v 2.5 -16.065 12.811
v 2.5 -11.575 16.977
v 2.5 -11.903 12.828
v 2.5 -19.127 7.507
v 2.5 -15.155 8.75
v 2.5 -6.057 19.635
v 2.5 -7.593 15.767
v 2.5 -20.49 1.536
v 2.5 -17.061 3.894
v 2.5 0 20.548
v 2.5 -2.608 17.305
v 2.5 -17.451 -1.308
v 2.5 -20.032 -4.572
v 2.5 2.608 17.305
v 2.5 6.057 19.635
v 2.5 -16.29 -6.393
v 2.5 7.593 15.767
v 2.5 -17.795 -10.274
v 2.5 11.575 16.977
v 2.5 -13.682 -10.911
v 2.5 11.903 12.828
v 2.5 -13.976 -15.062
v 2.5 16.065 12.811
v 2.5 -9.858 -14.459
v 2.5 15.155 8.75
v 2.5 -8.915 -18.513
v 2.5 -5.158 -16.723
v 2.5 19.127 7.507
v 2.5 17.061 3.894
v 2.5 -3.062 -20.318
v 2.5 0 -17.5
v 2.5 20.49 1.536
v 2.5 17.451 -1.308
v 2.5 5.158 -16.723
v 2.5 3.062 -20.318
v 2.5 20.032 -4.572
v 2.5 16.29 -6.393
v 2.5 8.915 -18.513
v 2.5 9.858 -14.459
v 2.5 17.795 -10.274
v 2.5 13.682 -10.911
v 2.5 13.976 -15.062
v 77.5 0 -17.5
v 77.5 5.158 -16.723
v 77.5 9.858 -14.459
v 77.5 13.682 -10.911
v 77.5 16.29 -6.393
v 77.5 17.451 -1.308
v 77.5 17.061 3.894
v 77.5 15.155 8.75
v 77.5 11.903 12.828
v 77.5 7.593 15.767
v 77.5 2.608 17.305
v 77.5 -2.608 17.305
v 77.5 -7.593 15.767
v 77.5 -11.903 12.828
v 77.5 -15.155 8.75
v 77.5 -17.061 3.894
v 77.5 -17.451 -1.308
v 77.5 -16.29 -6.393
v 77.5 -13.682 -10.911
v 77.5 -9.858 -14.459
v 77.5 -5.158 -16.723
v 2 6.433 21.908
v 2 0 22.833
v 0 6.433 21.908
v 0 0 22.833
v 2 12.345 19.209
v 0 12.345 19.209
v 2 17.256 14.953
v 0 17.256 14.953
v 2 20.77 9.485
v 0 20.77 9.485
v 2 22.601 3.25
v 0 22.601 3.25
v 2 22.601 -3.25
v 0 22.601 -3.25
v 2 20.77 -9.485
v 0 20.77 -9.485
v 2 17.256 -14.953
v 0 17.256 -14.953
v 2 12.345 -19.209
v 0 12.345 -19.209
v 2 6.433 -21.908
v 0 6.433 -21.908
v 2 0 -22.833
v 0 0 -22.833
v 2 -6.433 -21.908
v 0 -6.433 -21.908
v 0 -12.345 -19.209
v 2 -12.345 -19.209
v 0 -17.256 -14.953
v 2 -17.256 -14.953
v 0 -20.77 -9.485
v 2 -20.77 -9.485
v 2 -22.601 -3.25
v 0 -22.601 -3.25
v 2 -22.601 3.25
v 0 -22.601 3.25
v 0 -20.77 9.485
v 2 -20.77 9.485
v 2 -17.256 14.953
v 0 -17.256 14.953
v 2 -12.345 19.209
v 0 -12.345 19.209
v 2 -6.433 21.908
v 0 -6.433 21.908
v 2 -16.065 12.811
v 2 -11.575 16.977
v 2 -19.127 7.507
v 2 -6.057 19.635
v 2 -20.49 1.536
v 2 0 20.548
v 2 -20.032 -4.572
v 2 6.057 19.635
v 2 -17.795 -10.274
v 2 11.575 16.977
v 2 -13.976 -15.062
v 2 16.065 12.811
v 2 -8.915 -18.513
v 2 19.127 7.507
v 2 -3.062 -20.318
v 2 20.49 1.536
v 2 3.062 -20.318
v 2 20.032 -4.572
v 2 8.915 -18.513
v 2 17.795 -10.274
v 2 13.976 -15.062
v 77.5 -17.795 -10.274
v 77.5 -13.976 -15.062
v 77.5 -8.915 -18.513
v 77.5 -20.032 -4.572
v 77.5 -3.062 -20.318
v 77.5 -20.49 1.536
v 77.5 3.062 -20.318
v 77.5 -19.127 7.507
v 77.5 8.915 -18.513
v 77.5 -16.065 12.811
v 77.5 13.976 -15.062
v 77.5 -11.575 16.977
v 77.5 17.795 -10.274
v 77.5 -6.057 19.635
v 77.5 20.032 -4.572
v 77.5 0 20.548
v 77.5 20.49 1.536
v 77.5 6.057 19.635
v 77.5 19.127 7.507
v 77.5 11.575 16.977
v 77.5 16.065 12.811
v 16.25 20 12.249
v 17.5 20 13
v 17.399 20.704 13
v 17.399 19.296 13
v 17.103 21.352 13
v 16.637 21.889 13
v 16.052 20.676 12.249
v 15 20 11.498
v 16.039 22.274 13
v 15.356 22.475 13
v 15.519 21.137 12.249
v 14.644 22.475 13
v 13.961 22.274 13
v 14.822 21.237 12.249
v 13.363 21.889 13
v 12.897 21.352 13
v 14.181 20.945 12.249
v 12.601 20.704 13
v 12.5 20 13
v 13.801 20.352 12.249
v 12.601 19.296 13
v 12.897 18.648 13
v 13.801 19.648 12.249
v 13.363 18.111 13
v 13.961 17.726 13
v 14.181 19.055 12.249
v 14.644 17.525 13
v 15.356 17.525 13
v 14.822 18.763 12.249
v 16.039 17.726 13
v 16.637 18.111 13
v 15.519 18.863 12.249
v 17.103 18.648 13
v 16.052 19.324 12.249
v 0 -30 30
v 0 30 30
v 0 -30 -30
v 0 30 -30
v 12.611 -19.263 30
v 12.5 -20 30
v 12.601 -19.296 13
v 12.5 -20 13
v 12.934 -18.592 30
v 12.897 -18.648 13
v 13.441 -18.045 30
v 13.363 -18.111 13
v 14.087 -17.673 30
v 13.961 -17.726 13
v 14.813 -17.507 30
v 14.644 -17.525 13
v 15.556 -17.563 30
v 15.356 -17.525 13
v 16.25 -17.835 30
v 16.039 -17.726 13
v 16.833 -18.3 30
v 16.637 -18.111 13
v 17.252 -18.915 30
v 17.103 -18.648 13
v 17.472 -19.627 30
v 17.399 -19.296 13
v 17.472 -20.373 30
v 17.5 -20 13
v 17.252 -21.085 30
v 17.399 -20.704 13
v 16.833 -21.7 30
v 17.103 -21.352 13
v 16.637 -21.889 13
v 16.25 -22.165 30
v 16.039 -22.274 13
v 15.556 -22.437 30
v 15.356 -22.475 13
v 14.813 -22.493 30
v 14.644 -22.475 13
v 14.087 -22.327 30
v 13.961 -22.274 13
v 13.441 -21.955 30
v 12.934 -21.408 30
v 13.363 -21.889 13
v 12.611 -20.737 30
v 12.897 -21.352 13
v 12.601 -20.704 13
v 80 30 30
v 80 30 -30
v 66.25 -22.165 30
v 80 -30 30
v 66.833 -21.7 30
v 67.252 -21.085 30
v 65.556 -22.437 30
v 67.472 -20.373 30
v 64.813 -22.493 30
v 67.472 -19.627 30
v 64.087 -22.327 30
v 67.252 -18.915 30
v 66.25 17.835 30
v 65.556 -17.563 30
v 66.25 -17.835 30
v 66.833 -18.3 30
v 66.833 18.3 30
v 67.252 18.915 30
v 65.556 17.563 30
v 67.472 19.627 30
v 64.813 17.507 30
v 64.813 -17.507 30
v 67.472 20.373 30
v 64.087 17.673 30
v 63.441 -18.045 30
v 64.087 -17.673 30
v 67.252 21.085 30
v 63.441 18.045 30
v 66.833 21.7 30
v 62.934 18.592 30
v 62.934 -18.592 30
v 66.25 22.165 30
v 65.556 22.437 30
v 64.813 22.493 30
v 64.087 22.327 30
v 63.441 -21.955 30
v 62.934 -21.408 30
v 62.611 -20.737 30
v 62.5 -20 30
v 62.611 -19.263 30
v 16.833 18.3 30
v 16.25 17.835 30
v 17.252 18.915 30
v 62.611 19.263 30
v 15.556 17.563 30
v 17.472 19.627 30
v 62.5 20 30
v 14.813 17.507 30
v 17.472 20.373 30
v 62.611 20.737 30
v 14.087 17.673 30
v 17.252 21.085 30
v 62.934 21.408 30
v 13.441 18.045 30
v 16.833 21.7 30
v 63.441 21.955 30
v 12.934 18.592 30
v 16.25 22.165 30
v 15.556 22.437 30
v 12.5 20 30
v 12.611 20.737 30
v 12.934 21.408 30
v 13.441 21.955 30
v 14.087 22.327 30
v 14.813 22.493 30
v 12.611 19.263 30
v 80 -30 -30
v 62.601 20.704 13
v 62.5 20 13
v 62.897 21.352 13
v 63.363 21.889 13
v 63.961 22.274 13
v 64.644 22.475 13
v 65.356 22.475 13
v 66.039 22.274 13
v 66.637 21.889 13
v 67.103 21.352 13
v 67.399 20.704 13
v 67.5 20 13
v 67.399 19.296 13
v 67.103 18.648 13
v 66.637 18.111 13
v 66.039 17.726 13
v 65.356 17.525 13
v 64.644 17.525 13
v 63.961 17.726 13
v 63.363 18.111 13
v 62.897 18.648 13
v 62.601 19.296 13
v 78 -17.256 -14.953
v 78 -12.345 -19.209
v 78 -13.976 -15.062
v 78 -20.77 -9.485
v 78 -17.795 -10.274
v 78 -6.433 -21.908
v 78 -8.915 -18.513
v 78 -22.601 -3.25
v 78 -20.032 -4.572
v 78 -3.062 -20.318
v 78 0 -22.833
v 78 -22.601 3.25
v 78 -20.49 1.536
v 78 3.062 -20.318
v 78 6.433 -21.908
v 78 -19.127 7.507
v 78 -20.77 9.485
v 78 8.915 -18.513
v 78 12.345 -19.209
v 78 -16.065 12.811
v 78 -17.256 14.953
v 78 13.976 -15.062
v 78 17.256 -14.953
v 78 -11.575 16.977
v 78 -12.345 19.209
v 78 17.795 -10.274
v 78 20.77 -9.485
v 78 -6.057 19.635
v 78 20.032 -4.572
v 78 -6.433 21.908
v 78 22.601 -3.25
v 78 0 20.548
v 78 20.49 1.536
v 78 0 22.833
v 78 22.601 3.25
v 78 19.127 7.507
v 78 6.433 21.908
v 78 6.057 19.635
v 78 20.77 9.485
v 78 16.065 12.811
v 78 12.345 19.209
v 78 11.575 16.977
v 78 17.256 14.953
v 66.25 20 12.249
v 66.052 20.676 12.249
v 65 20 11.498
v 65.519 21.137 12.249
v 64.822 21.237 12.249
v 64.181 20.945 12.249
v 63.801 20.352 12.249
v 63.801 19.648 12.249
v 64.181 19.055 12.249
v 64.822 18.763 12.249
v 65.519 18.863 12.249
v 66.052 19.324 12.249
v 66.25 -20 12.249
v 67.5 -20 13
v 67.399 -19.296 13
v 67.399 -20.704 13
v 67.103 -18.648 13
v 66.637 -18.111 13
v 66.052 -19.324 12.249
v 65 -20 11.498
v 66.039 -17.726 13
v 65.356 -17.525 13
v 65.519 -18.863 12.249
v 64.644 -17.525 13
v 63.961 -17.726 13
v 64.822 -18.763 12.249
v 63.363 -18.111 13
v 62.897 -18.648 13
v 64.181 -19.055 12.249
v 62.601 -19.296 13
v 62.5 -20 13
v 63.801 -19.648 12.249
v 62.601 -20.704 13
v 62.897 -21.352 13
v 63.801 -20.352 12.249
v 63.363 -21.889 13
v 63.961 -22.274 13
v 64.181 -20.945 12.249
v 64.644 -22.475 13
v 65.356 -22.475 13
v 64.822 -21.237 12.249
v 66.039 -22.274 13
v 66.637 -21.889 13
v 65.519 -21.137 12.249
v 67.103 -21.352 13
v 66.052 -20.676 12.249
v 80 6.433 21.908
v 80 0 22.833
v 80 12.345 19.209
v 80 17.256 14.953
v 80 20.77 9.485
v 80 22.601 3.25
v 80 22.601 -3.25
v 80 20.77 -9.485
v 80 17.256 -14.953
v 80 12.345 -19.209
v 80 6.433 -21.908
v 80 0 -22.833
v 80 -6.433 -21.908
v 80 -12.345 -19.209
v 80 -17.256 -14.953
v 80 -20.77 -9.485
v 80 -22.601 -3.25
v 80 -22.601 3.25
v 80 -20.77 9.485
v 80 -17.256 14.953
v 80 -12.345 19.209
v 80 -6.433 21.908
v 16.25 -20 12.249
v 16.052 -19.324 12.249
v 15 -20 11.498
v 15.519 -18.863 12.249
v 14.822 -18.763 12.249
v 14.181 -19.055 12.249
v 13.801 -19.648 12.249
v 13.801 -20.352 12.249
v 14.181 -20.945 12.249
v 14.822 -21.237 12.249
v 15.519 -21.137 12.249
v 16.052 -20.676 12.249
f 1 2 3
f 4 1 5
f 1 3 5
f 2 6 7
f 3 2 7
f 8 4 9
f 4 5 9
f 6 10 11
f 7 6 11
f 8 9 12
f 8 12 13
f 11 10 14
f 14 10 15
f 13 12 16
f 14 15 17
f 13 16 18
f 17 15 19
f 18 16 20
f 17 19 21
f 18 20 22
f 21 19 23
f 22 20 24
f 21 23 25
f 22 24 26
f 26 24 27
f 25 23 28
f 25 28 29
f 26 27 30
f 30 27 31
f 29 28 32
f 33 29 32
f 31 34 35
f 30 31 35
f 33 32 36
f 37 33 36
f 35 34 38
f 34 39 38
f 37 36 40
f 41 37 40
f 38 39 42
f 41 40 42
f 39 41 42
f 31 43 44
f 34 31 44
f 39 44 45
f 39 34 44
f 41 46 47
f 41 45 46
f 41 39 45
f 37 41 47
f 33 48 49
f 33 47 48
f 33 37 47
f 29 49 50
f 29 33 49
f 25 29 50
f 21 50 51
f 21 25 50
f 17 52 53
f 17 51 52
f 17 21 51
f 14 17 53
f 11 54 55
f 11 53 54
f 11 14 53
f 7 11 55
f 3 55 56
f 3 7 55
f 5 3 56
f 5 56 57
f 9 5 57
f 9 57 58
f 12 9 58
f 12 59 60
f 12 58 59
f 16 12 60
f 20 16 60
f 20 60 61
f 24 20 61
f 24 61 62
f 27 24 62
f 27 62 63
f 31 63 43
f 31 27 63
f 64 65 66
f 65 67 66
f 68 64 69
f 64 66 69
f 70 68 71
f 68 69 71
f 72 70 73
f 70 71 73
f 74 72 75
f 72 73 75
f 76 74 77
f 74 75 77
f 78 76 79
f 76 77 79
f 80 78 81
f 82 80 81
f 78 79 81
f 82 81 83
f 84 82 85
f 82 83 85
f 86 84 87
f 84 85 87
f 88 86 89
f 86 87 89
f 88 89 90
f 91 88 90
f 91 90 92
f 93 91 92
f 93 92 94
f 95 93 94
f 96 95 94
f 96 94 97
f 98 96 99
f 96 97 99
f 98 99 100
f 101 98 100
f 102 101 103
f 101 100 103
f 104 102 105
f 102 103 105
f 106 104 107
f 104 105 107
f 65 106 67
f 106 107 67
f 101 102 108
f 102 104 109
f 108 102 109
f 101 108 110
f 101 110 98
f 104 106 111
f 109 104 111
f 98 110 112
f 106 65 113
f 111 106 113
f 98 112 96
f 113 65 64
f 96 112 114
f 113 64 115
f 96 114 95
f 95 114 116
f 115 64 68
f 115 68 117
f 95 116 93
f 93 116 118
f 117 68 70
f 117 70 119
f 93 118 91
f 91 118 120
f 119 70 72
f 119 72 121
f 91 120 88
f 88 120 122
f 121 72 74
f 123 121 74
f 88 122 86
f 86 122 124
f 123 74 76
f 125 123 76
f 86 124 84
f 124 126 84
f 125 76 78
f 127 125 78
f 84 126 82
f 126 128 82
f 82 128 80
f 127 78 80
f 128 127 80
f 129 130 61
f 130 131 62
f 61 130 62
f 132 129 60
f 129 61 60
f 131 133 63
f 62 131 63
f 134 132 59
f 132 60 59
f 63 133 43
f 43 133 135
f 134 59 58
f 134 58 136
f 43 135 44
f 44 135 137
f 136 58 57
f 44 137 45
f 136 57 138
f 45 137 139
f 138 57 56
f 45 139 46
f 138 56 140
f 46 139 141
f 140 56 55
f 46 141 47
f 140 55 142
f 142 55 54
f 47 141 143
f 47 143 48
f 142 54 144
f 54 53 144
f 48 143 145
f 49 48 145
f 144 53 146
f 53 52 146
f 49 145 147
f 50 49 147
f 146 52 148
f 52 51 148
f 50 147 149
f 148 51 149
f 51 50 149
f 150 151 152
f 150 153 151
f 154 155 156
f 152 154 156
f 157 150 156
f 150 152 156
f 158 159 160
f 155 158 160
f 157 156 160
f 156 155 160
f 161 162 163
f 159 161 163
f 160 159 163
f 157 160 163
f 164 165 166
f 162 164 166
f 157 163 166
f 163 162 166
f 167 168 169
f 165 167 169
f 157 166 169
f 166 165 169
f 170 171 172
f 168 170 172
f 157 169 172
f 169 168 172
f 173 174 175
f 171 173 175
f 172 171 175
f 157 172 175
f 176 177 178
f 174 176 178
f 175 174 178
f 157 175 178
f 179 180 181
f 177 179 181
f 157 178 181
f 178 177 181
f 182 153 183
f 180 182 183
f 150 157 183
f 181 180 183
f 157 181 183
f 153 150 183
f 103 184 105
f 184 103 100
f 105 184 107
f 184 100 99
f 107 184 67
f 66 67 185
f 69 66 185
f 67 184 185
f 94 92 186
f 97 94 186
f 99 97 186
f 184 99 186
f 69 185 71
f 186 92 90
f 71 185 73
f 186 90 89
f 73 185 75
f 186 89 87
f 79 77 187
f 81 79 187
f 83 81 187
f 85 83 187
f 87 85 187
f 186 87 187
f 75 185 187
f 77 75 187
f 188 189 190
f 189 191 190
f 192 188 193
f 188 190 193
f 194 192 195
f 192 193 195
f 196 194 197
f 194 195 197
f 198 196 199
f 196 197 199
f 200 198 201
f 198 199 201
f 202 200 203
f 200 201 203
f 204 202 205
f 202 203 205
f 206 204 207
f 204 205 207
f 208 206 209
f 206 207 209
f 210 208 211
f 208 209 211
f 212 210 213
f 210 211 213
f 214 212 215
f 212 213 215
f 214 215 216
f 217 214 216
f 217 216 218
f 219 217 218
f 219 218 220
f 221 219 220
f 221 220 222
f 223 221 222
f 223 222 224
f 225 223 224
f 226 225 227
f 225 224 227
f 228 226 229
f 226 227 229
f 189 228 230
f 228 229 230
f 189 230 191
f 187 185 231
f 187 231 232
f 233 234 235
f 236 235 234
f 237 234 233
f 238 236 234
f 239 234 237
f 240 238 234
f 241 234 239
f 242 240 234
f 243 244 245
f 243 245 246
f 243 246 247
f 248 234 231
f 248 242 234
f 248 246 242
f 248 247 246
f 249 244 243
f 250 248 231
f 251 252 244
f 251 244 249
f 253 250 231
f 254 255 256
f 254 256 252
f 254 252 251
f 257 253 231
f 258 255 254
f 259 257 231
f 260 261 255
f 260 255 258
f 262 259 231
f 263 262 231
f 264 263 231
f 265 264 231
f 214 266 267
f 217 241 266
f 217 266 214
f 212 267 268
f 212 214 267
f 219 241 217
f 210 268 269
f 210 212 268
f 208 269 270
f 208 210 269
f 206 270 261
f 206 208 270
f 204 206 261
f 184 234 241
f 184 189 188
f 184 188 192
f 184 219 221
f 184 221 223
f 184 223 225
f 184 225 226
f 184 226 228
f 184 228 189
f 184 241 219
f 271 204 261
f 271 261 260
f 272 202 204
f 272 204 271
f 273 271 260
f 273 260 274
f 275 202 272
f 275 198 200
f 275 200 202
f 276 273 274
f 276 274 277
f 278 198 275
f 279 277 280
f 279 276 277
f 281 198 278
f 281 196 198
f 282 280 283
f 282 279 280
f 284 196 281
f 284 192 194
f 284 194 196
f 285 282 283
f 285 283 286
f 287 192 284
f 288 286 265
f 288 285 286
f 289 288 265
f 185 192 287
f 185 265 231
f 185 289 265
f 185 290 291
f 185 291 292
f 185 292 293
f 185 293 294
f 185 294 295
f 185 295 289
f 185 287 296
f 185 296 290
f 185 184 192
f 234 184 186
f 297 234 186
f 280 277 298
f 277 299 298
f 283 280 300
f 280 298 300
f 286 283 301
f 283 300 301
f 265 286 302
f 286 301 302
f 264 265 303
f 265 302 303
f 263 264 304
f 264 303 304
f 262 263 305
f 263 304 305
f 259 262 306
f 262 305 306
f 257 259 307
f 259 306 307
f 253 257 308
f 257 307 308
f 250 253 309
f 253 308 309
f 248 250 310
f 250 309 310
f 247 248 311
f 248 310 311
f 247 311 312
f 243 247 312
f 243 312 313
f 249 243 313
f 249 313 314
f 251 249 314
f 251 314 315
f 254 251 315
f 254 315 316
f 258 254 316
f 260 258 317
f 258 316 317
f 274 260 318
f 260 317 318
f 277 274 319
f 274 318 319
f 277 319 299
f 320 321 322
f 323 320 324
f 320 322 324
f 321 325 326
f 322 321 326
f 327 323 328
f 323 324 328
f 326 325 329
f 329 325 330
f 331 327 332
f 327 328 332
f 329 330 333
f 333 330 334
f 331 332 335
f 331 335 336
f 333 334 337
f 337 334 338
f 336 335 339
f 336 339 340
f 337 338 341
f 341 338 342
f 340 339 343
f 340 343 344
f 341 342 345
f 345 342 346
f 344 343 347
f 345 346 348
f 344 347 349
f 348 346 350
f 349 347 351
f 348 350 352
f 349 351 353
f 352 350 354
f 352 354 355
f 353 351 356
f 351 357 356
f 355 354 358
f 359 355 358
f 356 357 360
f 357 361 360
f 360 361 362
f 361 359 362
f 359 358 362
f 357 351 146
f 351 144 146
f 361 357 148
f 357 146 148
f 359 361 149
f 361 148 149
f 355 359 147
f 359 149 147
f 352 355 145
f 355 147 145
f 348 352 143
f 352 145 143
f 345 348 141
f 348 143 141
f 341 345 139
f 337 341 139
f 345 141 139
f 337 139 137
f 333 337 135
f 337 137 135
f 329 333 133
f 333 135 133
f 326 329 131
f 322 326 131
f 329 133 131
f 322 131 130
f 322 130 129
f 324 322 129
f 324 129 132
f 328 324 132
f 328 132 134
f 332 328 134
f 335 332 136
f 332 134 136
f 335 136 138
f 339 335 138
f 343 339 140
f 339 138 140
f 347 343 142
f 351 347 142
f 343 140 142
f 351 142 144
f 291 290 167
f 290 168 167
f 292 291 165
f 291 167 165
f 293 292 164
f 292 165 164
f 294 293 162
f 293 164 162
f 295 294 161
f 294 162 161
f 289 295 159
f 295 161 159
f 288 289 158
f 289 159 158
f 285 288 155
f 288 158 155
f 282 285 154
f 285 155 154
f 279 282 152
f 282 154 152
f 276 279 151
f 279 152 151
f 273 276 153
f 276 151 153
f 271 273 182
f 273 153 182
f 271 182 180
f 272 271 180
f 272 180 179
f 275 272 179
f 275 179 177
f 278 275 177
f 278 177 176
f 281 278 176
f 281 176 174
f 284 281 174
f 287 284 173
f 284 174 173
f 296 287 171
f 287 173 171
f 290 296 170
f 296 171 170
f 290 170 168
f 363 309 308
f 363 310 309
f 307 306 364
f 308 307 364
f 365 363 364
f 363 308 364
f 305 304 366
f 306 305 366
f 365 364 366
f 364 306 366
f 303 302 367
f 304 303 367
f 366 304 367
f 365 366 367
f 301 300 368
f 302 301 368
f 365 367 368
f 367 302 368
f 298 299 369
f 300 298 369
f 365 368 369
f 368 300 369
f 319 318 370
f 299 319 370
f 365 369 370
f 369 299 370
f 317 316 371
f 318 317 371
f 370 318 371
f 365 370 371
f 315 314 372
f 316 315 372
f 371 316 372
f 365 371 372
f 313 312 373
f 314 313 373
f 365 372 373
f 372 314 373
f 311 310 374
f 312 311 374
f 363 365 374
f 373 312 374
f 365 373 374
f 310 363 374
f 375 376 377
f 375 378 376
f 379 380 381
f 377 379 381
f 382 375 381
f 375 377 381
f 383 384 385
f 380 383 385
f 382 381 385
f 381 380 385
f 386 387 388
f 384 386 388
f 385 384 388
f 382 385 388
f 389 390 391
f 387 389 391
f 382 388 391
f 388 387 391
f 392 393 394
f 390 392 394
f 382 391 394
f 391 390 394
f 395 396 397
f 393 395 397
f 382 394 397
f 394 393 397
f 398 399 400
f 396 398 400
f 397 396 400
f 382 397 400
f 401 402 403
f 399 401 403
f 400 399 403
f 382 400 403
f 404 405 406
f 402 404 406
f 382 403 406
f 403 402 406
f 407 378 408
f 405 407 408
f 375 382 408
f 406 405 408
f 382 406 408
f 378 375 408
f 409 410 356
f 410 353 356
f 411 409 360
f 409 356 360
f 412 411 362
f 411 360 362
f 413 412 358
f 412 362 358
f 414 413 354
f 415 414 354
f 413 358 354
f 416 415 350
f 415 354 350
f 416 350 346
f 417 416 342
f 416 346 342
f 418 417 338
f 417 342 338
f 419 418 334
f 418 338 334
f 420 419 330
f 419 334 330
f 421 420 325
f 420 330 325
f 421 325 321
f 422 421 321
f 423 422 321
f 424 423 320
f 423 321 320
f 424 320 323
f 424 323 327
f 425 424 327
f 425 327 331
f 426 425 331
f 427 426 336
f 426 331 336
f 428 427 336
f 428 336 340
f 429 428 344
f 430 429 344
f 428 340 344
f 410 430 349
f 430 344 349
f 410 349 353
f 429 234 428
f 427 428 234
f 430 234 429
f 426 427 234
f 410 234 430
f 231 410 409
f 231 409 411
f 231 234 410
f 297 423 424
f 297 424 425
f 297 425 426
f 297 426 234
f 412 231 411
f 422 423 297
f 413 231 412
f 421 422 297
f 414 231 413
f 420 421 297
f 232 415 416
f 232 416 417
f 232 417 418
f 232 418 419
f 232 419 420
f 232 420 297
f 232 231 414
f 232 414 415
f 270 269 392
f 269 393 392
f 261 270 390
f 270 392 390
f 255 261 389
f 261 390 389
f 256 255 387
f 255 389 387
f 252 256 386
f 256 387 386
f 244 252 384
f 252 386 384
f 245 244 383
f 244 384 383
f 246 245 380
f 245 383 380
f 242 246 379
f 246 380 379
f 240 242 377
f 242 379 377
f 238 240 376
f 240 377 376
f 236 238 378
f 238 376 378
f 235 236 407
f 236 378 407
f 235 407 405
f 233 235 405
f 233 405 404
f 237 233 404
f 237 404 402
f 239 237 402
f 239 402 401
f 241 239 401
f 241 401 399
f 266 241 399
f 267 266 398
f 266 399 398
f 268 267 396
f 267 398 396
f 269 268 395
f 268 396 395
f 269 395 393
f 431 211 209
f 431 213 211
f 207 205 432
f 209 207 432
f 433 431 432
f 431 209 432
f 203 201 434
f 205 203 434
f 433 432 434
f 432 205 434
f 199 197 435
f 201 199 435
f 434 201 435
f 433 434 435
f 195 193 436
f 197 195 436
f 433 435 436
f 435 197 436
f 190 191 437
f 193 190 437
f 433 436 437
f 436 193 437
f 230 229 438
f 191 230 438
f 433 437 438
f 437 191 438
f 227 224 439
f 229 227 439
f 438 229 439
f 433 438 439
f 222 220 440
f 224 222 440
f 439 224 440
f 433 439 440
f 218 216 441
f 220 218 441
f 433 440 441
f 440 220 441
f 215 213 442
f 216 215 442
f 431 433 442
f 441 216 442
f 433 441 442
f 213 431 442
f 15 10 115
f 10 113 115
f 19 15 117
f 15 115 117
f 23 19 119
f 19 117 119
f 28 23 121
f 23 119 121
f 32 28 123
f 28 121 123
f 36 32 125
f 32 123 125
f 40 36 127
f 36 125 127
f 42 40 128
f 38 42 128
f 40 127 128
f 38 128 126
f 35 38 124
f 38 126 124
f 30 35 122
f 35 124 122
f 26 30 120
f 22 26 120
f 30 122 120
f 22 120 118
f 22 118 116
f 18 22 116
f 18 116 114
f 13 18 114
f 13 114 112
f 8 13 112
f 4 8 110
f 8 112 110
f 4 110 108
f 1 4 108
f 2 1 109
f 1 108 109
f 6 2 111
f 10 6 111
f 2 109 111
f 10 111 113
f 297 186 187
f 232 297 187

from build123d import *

# Parameters (mm, degrees)
SKETCH_1_W             = 60
SKETCH_1_H             = 60
SKETCH_1_R             = 17.5
EXTRUDE_1_DEPTH        = 80
HOLE_WIZARD_M6_1_D     = 5
HOLE_WIZARD_M6_1_DEPTH = 17
HOLE_WIZARD_M6_1_TIP   = 1.502151548


with BuildPart() as part:
    # 草图1 → 凸台-拉伸1 (new body)
    with BuildSketch(Plane(origin=(0, 0, 0), x_dir=(0, 0, -1), z_dir=(1, 0, 0))):
        Rectangle(SKETCH_1_W, SKETCH_1_H)
        Circle(SKETCH_1_R, mode=Mode.SUBTRACT)
    extrude(amount=EXTRUDE_1_DEPTH)

    # 草图6 → 切除-旋转5 (revolve, cut)
    with BuildSketch(Plane.XY):
        Polygon((0, 17.5), (2.5, 17.5), (2.5, 20.547619048), (2, 20.547619048), (2, 22.833333333), (0, 22.833333333), align=None)
    revolve(axis=Axis((80, 0, 0), (-1, 0, 0)), mode=Mode.SUBTRACT)

    # 草图7 → 切除-旋转6 (revolve, cut)
    with BuildSketch(Plane.XY):
        Polygon((77.5, 17.5), (80, 17.5), (80, 22.833333333), (78, 22.833333333), (78, 20.547619048), (77.5, 20.547619048), align=None)
    revolve(axis=Axis((80, 0, 0), (-1, 0, 0)), mode=Mode.SUBTRACT)

    # M6 螺纹孔1
    with Locations(Plane.XY.offset(30)):
        with Locations((15, 20), (15, -20), (65, -20), (65, 20)):
            Hole(HOLE_WIZARD_M6_1_D / 2, depth=HOLE_WIZARD_M6_1_DEPTH)
            with Locations((0, 0, -(HOLE_WIZARD_M6_1_DEPTH + HOLE_WIZARD_M6_1_TIP / 2))):  # 118° drill point
                Cone(0, HOLE_WIZARD_M6_1_D / 2, HOLE_WIZARD_M6_1_TIP, mode=Mode.SUBTRACT)


solid = part.part
